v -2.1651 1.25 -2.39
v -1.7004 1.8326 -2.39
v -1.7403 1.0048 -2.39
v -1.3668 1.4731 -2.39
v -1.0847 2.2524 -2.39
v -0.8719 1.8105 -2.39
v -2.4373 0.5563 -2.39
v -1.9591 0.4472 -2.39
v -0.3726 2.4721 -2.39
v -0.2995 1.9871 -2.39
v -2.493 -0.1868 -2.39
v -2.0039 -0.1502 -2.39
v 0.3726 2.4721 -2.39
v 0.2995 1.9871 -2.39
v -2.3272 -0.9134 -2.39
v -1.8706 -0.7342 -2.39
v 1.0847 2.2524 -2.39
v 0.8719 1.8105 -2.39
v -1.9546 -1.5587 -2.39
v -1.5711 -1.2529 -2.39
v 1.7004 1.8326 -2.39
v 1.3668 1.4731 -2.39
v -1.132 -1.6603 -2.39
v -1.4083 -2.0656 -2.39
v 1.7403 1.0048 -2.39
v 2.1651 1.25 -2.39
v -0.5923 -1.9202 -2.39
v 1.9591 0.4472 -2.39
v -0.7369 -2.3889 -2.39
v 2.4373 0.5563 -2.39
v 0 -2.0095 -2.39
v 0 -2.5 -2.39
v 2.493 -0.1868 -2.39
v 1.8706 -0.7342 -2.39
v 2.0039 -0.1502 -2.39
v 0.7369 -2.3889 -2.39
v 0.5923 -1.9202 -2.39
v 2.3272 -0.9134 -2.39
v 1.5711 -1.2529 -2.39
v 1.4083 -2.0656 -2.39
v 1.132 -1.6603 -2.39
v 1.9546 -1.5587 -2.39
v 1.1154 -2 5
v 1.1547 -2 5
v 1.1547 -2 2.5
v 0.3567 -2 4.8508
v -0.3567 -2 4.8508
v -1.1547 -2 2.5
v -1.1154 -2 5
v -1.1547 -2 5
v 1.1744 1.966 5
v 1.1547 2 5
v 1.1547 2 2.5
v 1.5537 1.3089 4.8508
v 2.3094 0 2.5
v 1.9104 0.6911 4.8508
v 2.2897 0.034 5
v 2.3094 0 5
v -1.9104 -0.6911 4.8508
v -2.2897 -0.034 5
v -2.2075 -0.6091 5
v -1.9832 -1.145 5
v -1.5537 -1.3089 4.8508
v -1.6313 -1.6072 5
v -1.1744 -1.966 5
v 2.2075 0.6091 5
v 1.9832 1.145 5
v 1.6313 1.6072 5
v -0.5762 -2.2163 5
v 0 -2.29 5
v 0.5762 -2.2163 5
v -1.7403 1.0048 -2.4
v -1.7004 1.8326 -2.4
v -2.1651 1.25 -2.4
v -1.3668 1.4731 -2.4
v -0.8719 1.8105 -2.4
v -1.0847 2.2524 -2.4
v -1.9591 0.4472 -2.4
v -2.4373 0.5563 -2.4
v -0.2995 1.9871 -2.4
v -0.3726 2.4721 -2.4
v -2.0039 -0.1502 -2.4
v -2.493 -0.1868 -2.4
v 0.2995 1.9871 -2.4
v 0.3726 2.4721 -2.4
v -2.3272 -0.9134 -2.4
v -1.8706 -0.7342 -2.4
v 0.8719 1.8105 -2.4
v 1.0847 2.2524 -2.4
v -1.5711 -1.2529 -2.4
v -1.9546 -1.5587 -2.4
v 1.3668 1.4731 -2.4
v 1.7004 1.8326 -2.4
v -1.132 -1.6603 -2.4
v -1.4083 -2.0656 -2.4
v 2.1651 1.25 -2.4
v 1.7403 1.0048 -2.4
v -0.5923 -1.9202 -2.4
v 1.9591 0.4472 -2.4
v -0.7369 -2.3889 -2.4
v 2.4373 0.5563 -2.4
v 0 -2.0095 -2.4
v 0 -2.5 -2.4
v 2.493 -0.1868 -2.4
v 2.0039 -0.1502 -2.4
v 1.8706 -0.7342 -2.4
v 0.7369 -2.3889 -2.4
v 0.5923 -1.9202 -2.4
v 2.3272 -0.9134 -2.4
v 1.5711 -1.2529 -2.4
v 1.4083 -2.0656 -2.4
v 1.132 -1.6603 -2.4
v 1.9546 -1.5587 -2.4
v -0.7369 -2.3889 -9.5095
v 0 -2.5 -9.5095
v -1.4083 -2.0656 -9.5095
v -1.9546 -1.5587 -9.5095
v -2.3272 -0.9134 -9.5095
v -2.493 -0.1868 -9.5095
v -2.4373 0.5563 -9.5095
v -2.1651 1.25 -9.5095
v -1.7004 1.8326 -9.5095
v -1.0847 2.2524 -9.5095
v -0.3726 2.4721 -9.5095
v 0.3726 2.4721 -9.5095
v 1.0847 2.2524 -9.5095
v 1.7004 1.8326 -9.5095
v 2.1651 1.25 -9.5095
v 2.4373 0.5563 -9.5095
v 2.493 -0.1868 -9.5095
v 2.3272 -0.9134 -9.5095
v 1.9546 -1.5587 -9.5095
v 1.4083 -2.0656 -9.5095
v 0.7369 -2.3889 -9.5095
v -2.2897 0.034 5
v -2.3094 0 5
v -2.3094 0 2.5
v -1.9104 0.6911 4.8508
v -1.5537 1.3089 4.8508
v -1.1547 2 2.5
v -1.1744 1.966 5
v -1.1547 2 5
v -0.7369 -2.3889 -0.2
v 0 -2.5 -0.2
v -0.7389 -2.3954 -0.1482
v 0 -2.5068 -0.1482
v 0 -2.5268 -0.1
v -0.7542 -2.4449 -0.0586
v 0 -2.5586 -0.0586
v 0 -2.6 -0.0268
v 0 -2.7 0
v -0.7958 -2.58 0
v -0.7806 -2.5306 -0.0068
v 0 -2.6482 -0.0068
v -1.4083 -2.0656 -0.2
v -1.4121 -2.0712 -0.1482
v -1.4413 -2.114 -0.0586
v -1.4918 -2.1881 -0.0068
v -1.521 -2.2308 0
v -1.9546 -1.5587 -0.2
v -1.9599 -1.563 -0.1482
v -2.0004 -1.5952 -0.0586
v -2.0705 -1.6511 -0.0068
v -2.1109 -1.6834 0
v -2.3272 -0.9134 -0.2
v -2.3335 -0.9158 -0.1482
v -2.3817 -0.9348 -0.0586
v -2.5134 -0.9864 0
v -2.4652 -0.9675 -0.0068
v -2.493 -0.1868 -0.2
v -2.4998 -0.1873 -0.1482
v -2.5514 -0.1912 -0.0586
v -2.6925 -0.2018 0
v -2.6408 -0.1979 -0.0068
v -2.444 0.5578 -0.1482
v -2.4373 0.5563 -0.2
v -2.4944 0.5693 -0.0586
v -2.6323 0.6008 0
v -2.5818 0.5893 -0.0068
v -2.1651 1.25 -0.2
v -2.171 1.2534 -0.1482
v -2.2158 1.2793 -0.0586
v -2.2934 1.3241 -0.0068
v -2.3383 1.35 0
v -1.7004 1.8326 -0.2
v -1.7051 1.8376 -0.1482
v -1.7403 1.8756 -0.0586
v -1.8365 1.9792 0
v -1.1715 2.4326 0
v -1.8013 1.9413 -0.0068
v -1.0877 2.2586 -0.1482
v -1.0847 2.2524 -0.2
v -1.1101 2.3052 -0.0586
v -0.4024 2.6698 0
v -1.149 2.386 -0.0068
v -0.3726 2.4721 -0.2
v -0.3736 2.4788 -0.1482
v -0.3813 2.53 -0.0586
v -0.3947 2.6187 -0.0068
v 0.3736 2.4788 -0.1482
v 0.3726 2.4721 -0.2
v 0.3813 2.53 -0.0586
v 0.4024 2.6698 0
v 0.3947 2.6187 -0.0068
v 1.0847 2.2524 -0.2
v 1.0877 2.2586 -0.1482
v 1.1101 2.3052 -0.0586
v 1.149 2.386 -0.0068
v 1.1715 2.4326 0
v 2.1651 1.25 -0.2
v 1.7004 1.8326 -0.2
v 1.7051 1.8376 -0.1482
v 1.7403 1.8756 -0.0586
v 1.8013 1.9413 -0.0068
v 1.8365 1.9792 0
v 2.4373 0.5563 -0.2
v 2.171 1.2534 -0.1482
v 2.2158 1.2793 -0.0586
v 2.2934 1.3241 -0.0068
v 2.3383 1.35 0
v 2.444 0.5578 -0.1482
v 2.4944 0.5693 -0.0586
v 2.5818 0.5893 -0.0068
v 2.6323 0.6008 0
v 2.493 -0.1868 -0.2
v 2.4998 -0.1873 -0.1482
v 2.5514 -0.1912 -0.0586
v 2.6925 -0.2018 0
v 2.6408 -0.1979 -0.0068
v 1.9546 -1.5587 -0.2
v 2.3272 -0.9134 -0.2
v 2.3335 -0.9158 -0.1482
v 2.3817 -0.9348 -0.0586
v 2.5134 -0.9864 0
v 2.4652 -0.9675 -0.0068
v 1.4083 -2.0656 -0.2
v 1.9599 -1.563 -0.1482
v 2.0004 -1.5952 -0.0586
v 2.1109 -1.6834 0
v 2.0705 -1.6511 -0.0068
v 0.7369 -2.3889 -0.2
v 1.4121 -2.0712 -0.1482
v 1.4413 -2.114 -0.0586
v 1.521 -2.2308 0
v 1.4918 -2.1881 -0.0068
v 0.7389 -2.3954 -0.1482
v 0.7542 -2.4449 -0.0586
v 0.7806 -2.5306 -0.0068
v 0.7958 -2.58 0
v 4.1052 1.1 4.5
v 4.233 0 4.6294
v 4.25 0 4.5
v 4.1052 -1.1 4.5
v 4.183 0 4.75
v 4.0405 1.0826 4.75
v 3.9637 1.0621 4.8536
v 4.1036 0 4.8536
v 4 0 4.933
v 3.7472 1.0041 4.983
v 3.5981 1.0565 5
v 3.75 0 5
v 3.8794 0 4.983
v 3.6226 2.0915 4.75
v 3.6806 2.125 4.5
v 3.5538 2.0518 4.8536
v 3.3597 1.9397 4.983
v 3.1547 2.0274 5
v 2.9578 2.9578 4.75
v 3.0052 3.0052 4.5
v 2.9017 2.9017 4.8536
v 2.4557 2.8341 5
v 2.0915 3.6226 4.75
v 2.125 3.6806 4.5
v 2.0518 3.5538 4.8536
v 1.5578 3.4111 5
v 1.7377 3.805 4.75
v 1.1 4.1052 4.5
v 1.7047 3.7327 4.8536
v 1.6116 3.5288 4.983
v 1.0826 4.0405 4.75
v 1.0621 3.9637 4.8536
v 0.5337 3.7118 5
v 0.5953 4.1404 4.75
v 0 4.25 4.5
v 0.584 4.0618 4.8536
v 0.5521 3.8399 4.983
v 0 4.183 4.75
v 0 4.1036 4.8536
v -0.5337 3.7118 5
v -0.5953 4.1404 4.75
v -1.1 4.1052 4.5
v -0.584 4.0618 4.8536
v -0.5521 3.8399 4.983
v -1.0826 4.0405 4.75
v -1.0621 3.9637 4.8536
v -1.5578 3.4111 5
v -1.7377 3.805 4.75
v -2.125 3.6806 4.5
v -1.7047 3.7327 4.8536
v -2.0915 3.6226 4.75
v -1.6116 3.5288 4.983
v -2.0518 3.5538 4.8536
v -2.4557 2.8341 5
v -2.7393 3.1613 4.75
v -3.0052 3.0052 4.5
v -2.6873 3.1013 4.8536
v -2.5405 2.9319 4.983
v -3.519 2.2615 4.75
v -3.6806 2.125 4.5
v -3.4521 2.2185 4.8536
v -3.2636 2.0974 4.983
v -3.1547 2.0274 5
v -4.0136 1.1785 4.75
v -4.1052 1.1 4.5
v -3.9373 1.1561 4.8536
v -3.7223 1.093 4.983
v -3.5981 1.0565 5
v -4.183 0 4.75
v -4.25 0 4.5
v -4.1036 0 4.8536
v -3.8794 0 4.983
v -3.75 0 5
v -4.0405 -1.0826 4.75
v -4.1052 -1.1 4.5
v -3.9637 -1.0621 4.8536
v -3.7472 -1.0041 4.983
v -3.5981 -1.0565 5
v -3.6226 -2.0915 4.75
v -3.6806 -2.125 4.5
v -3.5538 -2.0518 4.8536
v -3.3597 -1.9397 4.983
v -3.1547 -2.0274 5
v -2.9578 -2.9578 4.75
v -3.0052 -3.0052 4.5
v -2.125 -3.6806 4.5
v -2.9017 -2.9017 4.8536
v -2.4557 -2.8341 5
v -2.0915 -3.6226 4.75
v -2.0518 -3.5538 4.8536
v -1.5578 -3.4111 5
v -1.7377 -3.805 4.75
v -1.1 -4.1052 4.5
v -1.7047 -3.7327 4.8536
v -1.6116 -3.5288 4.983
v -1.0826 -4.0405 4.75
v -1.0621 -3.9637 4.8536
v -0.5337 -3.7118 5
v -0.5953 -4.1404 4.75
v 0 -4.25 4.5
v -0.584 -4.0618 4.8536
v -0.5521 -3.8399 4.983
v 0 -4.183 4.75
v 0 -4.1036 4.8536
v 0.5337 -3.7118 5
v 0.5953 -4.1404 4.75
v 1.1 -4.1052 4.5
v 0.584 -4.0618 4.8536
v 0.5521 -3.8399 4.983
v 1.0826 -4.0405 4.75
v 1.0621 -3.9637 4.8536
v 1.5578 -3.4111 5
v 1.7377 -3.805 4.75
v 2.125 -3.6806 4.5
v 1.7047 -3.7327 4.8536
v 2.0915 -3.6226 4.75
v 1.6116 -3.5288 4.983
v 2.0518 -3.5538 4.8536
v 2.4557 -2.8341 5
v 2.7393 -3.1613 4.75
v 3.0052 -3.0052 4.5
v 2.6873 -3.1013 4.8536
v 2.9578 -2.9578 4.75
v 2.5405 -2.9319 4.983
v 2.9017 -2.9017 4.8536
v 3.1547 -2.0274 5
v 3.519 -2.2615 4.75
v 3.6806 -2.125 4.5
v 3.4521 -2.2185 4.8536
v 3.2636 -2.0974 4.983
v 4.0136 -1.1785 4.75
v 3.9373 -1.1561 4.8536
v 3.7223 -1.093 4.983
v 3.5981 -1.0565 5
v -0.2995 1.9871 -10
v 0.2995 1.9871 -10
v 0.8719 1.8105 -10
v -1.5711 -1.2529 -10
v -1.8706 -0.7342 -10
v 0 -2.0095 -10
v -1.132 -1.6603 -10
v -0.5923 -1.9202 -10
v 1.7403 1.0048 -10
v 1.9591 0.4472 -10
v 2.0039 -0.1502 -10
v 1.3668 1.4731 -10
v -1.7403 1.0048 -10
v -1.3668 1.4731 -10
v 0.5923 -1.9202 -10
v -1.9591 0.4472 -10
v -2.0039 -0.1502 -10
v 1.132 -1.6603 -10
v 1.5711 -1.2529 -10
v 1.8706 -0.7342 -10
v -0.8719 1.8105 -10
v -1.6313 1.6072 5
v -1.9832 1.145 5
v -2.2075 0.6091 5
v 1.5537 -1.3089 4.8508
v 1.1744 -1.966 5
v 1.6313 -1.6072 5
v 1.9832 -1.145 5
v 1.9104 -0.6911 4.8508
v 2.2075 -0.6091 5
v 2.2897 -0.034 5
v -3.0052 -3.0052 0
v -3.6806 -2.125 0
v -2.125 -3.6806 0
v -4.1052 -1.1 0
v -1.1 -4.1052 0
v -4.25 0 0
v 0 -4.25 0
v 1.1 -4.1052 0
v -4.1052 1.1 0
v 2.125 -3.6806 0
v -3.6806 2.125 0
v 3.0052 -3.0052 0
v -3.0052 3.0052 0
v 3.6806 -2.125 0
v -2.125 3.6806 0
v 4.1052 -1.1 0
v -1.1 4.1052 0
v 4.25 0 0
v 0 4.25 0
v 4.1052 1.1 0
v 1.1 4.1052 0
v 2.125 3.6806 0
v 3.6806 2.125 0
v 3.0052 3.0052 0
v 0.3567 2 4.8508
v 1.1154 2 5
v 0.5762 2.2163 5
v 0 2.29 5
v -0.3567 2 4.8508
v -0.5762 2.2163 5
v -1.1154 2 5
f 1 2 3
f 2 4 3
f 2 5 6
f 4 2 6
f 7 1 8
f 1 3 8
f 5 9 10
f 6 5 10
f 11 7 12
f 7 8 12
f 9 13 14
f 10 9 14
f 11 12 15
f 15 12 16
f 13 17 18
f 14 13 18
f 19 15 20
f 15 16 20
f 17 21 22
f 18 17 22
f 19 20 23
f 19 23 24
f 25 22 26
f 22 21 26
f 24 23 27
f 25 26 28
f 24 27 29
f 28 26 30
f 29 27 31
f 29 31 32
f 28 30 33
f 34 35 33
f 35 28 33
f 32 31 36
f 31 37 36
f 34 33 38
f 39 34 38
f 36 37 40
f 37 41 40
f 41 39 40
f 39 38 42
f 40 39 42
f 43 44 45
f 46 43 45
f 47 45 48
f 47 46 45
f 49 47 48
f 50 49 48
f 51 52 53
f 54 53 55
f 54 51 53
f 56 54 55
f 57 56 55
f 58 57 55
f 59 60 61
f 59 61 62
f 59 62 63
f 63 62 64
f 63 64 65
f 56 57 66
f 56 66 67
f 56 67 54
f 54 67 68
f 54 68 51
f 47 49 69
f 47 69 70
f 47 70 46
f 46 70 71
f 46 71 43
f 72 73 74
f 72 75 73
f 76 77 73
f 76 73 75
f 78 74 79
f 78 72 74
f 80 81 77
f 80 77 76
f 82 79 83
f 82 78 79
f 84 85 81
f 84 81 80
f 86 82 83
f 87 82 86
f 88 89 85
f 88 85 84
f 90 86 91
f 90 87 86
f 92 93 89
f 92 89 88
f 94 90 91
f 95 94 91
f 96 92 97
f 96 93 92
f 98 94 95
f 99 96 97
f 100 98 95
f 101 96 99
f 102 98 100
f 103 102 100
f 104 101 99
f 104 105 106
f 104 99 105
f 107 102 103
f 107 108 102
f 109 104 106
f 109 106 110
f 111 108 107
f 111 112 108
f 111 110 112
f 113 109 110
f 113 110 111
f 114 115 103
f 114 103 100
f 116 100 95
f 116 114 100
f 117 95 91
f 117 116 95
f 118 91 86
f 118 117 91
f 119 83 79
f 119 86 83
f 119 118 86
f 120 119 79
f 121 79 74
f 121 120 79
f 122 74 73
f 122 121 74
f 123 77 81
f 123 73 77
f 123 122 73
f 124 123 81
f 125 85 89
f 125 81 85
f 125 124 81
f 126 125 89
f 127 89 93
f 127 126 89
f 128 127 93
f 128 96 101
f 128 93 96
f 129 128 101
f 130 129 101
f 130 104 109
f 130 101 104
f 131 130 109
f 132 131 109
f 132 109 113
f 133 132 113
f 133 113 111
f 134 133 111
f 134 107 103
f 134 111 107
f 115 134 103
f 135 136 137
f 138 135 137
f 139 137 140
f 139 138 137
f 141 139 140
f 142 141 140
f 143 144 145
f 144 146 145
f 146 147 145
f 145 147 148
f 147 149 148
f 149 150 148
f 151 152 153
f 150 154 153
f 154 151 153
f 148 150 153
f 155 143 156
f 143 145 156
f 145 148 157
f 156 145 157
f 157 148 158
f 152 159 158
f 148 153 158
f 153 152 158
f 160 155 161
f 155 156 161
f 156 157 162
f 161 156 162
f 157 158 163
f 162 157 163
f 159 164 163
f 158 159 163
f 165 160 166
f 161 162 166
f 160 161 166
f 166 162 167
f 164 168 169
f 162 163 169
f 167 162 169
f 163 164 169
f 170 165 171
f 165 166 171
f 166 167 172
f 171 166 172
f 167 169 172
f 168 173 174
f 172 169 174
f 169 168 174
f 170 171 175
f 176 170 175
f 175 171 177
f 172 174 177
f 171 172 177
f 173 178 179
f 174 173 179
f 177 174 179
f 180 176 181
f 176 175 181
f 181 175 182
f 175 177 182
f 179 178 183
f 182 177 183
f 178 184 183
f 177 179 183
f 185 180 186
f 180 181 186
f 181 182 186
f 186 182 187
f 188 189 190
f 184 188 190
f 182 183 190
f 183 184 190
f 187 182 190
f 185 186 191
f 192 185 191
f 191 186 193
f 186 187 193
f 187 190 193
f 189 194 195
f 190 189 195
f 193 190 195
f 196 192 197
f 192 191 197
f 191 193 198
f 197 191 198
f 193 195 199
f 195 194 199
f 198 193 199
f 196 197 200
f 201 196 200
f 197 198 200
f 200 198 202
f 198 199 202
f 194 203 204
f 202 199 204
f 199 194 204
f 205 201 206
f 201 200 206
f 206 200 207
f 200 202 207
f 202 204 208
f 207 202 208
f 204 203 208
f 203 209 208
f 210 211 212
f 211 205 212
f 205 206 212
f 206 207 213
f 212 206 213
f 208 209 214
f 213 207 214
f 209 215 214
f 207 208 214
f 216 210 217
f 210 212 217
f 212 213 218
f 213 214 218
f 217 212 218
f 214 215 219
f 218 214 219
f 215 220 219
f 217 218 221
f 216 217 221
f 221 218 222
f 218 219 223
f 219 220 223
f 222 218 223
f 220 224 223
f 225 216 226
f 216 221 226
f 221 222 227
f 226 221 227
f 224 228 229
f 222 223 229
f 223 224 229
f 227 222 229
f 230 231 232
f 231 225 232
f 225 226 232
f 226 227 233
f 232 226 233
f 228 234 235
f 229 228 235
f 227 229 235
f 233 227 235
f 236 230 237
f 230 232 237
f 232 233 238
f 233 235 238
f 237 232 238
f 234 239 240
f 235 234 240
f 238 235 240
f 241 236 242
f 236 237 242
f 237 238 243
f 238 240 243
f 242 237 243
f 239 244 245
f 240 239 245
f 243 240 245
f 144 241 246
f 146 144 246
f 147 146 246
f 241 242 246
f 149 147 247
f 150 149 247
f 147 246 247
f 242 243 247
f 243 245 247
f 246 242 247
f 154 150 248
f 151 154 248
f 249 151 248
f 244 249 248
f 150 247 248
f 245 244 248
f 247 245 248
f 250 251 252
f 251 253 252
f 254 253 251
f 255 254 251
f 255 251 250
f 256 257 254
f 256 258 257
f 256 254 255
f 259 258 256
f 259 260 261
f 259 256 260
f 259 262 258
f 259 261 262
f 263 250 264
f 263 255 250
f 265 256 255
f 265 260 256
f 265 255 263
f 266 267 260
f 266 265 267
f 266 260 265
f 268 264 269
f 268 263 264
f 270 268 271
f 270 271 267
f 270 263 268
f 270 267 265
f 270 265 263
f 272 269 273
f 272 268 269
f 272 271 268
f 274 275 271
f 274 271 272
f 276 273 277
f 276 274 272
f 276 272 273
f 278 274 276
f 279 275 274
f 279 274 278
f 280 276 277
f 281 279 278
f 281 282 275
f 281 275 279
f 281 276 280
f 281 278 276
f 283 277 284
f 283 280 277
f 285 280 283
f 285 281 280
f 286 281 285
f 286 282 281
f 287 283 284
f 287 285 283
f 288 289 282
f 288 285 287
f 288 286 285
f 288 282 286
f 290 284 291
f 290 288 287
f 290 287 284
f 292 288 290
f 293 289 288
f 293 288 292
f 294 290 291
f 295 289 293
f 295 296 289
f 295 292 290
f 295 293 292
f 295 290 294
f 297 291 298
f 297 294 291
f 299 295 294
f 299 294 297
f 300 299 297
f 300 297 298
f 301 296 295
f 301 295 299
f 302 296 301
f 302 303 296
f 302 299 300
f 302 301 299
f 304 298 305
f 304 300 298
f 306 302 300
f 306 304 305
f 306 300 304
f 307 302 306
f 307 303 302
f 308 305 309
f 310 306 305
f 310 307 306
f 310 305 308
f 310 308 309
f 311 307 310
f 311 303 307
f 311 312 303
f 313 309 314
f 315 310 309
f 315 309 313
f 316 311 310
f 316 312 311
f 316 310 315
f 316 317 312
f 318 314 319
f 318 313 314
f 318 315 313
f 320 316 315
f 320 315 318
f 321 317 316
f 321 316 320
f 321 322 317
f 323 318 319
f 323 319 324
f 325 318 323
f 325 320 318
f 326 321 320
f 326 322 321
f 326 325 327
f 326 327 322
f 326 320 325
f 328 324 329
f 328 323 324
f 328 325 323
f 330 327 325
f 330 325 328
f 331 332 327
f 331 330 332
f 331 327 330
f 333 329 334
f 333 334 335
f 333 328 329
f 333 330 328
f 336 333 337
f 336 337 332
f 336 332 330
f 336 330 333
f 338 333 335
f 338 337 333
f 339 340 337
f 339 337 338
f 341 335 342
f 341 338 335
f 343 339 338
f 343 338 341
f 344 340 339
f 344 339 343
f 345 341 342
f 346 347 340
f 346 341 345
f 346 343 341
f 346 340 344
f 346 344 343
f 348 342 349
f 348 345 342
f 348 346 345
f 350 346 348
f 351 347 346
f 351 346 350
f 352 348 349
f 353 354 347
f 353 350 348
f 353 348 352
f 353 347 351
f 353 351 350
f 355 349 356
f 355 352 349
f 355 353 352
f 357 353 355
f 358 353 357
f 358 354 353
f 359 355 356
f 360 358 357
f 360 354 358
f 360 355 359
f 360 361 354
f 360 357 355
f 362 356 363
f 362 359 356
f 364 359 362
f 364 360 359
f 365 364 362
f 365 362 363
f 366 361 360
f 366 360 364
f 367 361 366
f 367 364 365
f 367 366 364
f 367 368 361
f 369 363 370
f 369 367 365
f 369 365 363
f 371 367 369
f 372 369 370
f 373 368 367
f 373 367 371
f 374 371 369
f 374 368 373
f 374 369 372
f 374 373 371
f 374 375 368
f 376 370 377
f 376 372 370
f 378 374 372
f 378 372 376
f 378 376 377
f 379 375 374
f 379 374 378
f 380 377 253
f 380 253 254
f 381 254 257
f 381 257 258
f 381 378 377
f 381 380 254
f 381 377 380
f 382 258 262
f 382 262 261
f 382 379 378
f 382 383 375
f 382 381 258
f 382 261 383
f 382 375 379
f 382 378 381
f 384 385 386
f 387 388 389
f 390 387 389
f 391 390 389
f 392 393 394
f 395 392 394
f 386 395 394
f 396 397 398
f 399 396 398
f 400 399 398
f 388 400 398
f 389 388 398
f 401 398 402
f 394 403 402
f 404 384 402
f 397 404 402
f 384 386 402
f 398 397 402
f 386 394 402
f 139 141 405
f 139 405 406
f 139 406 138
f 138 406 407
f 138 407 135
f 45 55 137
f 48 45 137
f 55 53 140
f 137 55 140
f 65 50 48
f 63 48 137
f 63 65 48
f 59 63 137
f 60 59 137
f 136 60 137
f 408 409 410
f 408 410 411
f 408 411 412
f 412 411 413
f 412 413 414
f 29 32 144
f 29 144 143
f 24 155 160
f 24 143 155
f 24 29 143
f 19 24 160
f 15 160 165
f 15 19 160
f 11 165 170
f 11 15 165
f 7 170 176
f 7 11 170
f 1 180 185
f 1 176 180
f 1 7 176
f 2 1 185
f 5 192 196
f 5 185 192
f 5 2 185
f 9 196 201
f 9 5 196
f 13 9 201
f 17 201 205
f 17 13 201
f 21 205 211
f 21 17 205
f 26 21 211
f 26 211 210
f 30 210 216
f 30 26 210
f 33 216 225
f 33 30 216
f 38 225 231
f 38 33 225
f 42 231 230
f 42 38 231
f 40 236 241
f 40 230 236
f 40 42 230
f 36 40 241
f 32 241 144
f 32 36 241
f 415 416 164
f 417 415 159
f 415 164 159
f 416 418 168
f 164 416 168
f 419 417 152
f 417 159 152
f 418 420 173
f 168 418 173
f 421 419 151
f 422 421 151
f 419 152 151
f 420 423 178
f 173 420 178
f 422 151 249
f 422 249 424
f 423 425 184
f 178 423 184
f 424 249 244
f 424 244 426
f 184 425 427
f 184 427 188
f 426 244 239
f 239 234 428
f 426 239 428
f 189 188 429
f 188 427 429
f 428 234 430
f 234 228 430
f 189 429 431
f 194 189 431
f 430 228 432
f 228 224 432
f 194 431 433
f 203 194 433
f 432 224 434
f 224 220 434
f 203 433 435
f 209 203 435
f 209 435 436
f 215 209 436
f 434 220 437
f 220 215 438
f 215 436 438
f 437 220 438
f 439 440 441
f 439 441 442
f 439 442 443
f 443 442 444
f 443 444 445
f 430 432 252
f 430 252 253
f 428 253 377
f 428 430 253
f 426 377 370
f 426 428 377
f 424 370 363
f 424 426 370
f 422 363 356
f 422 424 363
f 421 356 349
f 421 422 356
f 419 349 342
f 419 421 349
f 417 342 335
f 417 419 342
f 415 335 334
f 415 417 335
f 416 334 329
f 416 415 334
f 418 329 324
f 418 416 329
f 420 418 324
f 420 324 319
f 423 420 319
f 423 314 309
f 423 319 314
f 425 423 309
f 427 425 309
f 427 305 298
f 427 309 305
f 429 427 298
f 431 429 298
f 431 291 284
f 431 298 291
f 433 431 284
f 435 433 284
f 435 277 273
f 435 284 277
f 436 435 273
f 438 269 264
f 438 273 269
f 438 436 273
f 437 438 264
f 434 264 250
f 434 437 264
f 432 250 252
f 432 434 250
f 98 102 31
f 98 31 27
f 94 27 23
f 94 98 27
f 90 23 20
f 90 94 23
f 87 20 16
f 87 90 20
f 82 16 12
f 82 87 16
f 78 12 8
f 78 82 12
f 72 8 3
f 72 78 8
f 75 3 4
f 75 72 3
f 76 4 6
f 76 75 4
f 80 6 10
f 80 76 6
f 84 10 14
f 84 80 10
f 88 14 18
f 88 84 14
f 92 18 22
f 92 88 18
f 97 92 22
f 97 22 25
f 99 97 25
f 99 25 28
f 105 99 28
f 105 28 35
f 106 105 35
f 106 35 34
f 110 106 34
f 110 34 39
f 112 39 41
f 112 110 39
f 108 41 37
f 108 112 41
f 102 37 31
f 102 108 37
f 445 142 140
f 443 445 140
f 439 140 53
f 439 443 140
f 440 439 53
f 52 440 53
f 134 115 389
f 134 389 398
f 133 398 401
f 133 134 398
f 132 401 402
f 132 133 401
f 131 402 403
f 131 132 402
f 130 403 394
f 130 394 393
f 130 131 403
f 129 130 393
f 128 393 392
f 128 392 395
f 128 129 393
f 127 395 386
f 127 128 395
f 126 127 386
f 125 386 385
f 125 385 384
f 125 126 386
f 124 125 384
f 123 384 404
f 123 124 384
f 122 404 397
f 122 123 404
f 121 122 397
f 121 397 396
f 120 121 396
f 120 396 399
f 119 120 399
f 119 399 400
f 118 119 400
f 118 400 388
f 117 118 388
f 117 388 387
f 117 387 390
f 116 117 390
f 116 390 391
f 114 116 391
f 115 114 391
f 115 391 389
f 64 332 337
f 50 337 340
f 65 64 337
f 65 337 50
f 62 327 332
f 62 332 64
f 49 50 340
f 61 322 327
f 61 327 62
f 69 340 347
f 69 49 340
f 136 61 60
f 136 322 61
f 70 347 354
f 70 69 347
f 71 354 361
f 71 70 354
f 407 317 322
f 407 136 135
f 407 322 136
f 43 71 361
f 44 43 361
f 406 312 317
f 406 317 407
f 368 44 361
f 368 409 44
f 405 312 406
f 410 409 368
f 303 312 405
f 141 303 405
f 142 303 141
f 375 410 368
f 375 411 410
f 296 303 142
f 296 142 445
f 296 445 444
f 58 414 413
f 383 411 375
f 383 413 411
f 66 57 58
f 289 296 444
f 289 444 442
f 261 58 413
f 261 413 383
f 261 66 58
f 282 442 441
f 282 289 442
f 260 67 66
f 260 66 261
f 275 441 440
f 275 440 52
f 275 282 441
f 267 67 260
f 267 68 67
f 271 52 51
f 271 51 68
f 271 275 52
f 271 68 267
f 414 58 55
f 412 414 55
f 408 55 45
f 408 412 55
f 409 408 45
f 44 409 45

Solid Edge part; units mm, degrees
sketch "Sketch1" plane through (0, 0, 0) normal (0, 0, 1) x (1, 0, 0)
  circle A0 centre (0, 0) radius 4.25
extrude "Protrusion1" add sketch "Sketch1" along normal blind 5
sketch "Sketch2" plane through (0, 0, 5) normal (0, 0, 1) x (0, 1, 0)
  line L0 (0, 2.3094) -> (2, 1.1547)
  line L1 (2, 1.1547) -> (2, -1.1547)
  line L2 (2, -1.1547) -> (0, -2.3094)
  line L3 (0, -2.3094) -> (-2, -1.1547)
  line L4 (-2, -1.1547) -> (-2, 1.1547)
  line L5 (-2, 1.1547) -> (0, 2.3094)
extrude "Cutout1" cut sketch "Sketch2" against normal blind 2.5
fillet "Round1" radius 0.5 1 edges at (-4.25, 0, 5)
sketch "Sketch3" plane through (0, 0, 0) normal (1, 0, 0) x (0, 1, 0)
  line L0 (-2.0095, -10) -> (0, -10)
  line L1 (-2.5, -9.5095) -> (-2.0095, -10)
  line L2 (-2.5, -2.4) -> (-2.5, -9.5095)
  line L3 (-2.0095, -2.4) -> (-2.5, -2.4)
  line L4 (-2.0095, -2.39) -> (-2.0095, -2.4)
  line L5 (-2.5, -2.39) -> (-2.0095, -2.39)
  line L6 (-2.5, -0.2) -> (-2.5, -2.39)
  arc A0 (-2.5, -0.2) -> (-2.7, 0) centre (-2.7, -0.2) ccw
  dimension "D1" = 2.4
  dimension "D2" = 0.01
  dimension "D3" = 0.2
  dimension "D4" = 10
revolve "RevolvedProtrusion1" add sketch "Sketch3" angle 360 about axis through (0, 0, -60.325) along (0, 0, 1) material side at (0, -1.0048, -9.95)
cosmetic_thread "Thread1" size "M5"
sketch "Sketch4" plane through (0, 0, 0) normal (0, -1, 0) x (1, 0, 0)
  line L0 (-2.29, 5) -> (0, 3.6779)
revolve "RevolvedCutout1" cut sketch "Sketch4" angle 360 about axis through (0, 0, 57.15) along (0, 0, -1) material side at (-1.12, 0, 4.3823)
properties material "Stahl"
